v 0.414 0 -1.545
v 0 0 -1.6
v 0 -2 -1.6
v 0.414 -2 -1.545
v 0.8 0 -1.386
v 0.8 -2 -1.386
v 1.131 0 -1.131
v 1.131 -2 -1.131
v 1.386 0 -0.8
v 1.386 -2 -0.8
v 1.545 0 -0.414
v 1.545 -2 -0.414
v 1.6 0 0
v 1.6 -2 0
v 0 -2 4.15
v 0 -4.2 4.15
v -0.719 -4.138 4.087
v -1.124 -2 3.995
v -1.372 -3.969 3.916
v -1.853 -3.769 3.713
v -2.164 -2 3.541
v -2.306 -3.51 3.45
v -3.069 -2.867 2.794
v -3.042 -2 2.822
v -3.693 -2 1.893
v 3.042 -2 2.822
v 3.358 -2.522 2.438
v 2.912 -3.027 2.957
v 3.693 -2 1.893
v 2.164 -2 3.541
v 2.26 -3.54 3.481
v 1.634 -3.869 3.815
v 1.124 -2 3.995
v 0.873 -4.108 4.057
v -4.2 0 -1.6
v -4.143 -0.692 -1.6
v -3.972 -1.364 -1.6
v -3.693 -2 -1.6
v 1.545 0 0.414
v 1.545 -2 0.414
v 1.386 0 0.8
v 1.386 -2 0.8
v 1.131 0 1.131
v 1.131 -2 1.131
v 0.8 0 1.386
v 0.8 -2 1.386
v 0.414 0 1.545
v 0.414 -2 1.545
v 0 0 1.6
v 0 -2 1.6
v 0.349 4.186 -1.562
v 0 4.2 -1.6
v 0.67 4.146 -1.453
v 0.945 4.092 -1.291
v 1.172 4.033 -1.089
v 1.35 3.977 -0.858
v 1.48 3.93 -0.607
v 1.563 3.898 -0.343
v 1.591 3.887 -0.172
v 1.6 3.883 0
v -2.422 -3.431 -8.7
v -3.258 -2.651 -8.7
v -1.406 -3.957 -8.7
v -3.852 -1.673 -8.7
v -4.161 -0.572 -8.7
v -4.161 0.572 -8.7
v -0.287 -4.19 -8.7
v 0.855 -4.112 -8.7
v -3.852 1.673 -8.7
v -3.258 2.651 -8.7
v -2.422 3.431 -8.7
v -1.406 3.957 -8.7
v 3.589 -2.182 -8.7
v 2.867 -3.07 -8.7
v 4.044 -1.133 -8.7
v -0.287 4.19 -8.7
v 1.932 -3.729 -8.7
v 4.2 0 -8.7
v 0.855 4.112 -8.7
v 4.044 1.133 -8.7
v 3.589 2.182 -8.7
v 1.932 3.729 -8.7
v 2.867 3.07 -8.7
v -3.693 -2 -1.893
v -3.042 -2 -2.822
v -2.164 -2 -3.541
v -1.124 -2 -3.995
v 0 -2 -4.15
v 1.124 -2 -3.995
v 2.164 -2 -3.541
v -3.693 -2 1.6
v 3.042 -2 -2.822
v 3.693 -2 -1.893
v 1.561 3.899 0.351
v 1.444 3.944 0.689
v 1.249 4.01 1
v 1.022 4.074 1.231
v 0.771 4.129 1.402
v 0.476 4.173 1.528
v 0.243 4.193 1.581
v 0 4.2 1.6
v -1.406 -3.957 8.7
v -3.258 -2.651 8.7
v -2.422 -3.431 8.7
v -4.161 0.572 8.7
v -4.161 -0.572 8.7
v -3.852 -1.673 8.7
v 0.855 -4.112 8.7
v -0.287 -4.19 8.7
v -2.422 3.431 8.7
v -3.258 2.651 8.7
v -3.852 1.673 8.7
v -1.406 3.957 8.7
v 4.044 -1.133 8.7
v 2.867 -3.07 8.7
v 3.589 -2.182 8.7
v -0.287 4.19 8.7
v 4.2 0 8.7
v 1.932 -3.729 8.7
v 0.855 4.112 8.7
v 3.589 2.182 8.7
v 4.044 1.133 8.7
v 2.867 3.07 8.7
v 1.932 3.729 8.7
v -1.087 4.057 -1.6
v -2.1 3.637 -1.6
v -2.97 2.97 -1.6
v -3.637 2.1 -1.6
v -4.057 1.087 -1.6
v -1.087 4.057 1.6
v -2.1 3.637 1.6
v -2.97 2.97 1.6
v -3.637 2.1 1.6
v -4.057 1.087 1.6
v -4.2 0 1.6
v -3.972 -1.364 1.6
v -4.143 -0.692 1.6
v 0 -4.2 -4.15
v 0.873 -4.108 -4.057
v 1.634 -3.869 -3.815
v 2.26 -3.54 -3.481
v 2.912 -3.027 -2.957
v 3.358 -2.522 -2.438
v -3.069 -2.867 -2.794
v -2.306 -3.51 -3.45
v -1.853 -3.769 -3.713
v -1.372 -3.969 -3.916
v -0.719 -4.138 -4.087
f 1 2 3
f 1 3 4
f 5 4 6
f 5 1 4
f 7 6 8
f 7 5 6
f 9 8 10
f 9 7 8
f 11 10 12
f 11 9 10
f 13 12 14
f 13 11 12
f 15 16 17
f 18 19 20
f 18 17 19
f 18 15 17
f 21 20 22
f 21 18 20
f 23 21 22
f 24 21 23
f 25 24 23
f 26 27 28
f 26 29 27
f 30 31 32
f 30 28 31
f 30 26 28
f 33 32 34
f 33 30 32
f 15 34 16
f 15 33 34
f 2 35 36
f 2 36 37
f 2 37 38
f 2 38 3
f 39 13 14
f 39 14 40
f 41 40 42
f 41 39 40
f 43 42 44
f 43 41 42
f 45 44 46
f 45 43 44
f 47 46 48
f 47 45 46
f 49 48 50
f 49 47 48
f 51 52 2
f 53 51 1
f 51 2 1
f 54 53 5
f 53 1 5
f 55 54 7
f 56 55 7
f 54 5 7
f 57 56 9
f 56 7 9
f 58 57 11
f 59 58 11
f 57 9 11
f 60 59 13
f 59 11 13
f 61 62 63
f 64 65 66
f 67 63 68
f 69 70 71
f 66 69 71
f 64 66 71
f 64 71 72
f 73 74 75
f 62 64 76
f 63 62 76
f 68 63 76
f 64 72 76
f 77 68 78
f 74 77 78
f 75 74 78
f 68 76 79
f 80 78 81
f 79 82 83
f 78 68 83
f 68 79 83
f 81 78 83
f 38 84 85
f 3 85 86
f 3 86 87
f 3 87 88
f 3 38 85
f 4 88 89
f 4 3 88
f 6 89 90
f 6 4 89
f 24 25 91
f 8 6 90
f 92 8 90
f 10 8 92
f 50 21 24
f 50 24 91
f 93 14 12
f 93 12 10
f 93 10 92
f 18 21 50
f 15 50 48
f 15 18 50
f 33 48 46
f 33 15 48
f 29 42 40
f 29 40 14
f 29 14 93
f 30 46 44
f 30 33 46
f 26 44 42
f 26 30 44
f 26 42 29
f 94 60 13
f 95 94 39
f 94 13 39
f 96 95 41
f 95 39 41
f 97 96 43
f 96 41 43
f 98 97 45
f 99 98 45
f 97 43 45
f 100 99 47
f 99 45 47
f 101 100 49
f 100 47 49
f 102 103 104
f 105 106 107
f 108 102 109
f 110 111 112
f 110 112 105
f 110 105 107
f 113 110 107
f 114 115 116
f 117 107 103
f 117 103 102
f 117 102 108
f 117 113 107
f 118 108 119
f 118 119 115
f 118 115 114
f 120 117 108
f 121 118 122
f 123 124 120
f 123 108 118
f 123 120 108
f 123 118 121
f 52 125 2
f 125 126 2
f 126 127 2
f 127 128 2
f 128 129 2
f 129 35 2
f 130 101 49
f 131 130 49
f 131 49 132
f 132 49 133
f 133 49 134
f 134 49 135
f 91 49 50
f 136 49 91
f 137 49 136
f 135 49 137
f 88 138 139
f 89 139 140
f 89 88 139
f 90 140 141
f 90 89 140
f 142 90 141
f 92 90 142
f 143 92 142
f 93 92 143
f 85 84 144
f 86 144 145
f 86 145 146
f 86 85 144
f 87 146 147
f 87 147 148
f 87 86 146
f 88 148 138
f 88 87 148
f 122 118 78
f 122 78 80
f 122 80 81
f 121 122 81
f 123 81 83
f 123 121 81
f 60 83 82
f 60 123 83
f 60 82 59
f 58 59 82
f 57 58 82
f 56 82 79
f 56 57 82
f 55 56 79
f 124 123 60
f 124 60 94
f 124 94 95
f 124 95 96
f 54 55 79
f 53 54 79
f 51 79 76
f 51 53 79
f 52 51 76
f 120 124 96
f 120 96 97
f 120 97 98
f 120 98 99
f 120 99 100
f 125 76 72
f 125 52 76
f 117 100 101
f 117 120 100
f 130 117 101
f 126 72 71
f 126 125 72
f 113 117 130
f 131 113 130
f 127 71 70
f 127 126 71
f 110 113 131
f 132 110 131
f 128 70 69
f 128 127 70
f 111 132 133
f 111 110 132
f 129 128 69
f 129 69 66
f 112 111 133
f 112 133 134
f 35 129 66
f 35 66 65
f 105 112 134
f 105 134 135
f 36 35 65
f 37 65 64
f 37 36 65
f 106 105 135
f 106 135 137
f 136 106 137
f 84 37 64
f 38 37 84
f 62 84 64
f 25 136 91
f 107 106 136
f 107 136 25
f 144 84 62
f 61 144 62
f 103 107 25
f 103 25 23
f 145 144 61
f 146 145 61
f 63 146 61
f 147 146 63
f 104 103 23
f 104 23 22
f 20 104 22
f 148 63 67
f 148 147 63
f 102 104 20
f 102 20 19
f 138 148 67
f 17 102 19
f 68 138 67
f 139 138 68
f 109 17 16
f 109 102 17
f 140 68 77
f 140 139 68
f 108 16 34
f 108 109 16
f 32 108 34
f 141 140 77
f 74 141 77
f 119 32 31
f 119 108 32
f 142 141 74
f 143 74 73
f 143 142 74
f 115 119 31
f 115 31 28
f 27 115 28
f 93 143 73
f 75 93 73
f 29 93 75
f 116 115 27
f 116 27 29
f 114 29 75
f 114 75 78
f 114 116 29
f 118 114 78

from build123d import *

# Parameters (mm, degrees)
F0_R          = 4.2
F2_DEPTH      = 8.7
F2_DEPTH_BACK = 8.7
F3_START      = 2
F3_DEPTH      = 3
F4_DEPTH      = 25
F4_DEPTH_BACK = 25


with BuildPart() as f2:
    # F0 (on Top) → F2 (new body, two sides)
    with BuildSketch(Plane.XY) as f2_sk:
        Circle(F0_R)
    extrude(amount=F2_DEPTH)
    extrude(f2_sk.sketch, amount=-F2_DEPTH_BACK)

    # F1 (on Front) → F3 (cut)
    with BuildSketch(Plane.XZ.offset(F3_START)):
        with BuildLine():
            ThreePointArc((0, -4.15), (2.9344931419, -2.9344931419), (4.15, 0))
            ThreePointArc((4.15, 0), (2.9344931419, 2.9344931419), (0, 4.15))
            ThreePointArc((0, 4.15), (-2.3002717231, 3.4541641536), (-3.8291643997, 1.6))
            Line((-3.8291643997, 1.6), (0, 1.6))
            ThreePointArc((0, 1.6), (1.1313708499, 1.1313708499), (1.6, 0))
            ThreePointArc((1.6, 0), (1.1313708499, -1.1313708499), (0, -1.6))
            Line((0, -1.6), (-3.8291643997, -1.6))
            ThreePointArc((-3.8291643997, -1.6), (-2.3002717231, -3.4541641536), (0, -4.15))
        make_face()
    extrude(amount=F3_DEPTH, mode=Mode.SUBTRACT)

    # F1 (on Front) → F4 (cut, two sides)
    with BuildSketch(Plane.XZ) as f4_sk:
        with BuildLine():
            Line((0, 1.6), (-3.8291643997, 1.6))
            ThreePointArc((-3.8291643997, 1.6), (-4.0690006303, 0.8159251624), (-4.15, 0))
            ThreePointArc((-4.15, 0), (-4.0690006303, -0.8159251624), (-3.8291643997, -1.6))
            Line((-3.8291643997, -1.6), (0, -1.6))
            ThreePointArc((0, -1.6), (-1.6, 0), (0, 1.6))
        make_face()
        with BuildLine():
            ThreePointArc((1.6, 0), (1.1313708499, 1.1313708499), (0, 1.6))
            ThreePointArc((0, 1.6), (-1.6, 0), (0, -1.6))
            ThreePointArc((0, -1.6), (1.1313708499, -1.1313708499), (1.6, 0))
        make_face()
        with BuildLine():
            Line((-4.15, -1.6), (-3.8291643997, -1.6))
            ThreePointArc((-3.8291643997, -1.6), (-4.0690006303, -0.8159251624), (-4.15, 0))
            Line((-4.15, 0), (-4.15, -1.6))
        make_face()
        with BuildLine():
            ThreePointArc((-4.15, 0), (-4.0690006303, 0.8159251624), (-3.8291643997, 1.6))
            Line((-3.8291643997, 1.6), (-4.15, 1.6))
            Line((-4.15, 1.6), (-4.15, 0))
        make_face()
        Polygon((-4.15, -1.6), (-4.15, 0), (-4.15, 1.6), (-4.2, 1.6), (-4.2, -1.6), align=None)
    extrude(amount=-F4_DEPTH, mode=Mode.SUBTRACT)
    extrude(f4_sk.sketch, amount=F4_DEPTH_BACK, mode=Mode.SUBTRACT)


solid = f2.part
